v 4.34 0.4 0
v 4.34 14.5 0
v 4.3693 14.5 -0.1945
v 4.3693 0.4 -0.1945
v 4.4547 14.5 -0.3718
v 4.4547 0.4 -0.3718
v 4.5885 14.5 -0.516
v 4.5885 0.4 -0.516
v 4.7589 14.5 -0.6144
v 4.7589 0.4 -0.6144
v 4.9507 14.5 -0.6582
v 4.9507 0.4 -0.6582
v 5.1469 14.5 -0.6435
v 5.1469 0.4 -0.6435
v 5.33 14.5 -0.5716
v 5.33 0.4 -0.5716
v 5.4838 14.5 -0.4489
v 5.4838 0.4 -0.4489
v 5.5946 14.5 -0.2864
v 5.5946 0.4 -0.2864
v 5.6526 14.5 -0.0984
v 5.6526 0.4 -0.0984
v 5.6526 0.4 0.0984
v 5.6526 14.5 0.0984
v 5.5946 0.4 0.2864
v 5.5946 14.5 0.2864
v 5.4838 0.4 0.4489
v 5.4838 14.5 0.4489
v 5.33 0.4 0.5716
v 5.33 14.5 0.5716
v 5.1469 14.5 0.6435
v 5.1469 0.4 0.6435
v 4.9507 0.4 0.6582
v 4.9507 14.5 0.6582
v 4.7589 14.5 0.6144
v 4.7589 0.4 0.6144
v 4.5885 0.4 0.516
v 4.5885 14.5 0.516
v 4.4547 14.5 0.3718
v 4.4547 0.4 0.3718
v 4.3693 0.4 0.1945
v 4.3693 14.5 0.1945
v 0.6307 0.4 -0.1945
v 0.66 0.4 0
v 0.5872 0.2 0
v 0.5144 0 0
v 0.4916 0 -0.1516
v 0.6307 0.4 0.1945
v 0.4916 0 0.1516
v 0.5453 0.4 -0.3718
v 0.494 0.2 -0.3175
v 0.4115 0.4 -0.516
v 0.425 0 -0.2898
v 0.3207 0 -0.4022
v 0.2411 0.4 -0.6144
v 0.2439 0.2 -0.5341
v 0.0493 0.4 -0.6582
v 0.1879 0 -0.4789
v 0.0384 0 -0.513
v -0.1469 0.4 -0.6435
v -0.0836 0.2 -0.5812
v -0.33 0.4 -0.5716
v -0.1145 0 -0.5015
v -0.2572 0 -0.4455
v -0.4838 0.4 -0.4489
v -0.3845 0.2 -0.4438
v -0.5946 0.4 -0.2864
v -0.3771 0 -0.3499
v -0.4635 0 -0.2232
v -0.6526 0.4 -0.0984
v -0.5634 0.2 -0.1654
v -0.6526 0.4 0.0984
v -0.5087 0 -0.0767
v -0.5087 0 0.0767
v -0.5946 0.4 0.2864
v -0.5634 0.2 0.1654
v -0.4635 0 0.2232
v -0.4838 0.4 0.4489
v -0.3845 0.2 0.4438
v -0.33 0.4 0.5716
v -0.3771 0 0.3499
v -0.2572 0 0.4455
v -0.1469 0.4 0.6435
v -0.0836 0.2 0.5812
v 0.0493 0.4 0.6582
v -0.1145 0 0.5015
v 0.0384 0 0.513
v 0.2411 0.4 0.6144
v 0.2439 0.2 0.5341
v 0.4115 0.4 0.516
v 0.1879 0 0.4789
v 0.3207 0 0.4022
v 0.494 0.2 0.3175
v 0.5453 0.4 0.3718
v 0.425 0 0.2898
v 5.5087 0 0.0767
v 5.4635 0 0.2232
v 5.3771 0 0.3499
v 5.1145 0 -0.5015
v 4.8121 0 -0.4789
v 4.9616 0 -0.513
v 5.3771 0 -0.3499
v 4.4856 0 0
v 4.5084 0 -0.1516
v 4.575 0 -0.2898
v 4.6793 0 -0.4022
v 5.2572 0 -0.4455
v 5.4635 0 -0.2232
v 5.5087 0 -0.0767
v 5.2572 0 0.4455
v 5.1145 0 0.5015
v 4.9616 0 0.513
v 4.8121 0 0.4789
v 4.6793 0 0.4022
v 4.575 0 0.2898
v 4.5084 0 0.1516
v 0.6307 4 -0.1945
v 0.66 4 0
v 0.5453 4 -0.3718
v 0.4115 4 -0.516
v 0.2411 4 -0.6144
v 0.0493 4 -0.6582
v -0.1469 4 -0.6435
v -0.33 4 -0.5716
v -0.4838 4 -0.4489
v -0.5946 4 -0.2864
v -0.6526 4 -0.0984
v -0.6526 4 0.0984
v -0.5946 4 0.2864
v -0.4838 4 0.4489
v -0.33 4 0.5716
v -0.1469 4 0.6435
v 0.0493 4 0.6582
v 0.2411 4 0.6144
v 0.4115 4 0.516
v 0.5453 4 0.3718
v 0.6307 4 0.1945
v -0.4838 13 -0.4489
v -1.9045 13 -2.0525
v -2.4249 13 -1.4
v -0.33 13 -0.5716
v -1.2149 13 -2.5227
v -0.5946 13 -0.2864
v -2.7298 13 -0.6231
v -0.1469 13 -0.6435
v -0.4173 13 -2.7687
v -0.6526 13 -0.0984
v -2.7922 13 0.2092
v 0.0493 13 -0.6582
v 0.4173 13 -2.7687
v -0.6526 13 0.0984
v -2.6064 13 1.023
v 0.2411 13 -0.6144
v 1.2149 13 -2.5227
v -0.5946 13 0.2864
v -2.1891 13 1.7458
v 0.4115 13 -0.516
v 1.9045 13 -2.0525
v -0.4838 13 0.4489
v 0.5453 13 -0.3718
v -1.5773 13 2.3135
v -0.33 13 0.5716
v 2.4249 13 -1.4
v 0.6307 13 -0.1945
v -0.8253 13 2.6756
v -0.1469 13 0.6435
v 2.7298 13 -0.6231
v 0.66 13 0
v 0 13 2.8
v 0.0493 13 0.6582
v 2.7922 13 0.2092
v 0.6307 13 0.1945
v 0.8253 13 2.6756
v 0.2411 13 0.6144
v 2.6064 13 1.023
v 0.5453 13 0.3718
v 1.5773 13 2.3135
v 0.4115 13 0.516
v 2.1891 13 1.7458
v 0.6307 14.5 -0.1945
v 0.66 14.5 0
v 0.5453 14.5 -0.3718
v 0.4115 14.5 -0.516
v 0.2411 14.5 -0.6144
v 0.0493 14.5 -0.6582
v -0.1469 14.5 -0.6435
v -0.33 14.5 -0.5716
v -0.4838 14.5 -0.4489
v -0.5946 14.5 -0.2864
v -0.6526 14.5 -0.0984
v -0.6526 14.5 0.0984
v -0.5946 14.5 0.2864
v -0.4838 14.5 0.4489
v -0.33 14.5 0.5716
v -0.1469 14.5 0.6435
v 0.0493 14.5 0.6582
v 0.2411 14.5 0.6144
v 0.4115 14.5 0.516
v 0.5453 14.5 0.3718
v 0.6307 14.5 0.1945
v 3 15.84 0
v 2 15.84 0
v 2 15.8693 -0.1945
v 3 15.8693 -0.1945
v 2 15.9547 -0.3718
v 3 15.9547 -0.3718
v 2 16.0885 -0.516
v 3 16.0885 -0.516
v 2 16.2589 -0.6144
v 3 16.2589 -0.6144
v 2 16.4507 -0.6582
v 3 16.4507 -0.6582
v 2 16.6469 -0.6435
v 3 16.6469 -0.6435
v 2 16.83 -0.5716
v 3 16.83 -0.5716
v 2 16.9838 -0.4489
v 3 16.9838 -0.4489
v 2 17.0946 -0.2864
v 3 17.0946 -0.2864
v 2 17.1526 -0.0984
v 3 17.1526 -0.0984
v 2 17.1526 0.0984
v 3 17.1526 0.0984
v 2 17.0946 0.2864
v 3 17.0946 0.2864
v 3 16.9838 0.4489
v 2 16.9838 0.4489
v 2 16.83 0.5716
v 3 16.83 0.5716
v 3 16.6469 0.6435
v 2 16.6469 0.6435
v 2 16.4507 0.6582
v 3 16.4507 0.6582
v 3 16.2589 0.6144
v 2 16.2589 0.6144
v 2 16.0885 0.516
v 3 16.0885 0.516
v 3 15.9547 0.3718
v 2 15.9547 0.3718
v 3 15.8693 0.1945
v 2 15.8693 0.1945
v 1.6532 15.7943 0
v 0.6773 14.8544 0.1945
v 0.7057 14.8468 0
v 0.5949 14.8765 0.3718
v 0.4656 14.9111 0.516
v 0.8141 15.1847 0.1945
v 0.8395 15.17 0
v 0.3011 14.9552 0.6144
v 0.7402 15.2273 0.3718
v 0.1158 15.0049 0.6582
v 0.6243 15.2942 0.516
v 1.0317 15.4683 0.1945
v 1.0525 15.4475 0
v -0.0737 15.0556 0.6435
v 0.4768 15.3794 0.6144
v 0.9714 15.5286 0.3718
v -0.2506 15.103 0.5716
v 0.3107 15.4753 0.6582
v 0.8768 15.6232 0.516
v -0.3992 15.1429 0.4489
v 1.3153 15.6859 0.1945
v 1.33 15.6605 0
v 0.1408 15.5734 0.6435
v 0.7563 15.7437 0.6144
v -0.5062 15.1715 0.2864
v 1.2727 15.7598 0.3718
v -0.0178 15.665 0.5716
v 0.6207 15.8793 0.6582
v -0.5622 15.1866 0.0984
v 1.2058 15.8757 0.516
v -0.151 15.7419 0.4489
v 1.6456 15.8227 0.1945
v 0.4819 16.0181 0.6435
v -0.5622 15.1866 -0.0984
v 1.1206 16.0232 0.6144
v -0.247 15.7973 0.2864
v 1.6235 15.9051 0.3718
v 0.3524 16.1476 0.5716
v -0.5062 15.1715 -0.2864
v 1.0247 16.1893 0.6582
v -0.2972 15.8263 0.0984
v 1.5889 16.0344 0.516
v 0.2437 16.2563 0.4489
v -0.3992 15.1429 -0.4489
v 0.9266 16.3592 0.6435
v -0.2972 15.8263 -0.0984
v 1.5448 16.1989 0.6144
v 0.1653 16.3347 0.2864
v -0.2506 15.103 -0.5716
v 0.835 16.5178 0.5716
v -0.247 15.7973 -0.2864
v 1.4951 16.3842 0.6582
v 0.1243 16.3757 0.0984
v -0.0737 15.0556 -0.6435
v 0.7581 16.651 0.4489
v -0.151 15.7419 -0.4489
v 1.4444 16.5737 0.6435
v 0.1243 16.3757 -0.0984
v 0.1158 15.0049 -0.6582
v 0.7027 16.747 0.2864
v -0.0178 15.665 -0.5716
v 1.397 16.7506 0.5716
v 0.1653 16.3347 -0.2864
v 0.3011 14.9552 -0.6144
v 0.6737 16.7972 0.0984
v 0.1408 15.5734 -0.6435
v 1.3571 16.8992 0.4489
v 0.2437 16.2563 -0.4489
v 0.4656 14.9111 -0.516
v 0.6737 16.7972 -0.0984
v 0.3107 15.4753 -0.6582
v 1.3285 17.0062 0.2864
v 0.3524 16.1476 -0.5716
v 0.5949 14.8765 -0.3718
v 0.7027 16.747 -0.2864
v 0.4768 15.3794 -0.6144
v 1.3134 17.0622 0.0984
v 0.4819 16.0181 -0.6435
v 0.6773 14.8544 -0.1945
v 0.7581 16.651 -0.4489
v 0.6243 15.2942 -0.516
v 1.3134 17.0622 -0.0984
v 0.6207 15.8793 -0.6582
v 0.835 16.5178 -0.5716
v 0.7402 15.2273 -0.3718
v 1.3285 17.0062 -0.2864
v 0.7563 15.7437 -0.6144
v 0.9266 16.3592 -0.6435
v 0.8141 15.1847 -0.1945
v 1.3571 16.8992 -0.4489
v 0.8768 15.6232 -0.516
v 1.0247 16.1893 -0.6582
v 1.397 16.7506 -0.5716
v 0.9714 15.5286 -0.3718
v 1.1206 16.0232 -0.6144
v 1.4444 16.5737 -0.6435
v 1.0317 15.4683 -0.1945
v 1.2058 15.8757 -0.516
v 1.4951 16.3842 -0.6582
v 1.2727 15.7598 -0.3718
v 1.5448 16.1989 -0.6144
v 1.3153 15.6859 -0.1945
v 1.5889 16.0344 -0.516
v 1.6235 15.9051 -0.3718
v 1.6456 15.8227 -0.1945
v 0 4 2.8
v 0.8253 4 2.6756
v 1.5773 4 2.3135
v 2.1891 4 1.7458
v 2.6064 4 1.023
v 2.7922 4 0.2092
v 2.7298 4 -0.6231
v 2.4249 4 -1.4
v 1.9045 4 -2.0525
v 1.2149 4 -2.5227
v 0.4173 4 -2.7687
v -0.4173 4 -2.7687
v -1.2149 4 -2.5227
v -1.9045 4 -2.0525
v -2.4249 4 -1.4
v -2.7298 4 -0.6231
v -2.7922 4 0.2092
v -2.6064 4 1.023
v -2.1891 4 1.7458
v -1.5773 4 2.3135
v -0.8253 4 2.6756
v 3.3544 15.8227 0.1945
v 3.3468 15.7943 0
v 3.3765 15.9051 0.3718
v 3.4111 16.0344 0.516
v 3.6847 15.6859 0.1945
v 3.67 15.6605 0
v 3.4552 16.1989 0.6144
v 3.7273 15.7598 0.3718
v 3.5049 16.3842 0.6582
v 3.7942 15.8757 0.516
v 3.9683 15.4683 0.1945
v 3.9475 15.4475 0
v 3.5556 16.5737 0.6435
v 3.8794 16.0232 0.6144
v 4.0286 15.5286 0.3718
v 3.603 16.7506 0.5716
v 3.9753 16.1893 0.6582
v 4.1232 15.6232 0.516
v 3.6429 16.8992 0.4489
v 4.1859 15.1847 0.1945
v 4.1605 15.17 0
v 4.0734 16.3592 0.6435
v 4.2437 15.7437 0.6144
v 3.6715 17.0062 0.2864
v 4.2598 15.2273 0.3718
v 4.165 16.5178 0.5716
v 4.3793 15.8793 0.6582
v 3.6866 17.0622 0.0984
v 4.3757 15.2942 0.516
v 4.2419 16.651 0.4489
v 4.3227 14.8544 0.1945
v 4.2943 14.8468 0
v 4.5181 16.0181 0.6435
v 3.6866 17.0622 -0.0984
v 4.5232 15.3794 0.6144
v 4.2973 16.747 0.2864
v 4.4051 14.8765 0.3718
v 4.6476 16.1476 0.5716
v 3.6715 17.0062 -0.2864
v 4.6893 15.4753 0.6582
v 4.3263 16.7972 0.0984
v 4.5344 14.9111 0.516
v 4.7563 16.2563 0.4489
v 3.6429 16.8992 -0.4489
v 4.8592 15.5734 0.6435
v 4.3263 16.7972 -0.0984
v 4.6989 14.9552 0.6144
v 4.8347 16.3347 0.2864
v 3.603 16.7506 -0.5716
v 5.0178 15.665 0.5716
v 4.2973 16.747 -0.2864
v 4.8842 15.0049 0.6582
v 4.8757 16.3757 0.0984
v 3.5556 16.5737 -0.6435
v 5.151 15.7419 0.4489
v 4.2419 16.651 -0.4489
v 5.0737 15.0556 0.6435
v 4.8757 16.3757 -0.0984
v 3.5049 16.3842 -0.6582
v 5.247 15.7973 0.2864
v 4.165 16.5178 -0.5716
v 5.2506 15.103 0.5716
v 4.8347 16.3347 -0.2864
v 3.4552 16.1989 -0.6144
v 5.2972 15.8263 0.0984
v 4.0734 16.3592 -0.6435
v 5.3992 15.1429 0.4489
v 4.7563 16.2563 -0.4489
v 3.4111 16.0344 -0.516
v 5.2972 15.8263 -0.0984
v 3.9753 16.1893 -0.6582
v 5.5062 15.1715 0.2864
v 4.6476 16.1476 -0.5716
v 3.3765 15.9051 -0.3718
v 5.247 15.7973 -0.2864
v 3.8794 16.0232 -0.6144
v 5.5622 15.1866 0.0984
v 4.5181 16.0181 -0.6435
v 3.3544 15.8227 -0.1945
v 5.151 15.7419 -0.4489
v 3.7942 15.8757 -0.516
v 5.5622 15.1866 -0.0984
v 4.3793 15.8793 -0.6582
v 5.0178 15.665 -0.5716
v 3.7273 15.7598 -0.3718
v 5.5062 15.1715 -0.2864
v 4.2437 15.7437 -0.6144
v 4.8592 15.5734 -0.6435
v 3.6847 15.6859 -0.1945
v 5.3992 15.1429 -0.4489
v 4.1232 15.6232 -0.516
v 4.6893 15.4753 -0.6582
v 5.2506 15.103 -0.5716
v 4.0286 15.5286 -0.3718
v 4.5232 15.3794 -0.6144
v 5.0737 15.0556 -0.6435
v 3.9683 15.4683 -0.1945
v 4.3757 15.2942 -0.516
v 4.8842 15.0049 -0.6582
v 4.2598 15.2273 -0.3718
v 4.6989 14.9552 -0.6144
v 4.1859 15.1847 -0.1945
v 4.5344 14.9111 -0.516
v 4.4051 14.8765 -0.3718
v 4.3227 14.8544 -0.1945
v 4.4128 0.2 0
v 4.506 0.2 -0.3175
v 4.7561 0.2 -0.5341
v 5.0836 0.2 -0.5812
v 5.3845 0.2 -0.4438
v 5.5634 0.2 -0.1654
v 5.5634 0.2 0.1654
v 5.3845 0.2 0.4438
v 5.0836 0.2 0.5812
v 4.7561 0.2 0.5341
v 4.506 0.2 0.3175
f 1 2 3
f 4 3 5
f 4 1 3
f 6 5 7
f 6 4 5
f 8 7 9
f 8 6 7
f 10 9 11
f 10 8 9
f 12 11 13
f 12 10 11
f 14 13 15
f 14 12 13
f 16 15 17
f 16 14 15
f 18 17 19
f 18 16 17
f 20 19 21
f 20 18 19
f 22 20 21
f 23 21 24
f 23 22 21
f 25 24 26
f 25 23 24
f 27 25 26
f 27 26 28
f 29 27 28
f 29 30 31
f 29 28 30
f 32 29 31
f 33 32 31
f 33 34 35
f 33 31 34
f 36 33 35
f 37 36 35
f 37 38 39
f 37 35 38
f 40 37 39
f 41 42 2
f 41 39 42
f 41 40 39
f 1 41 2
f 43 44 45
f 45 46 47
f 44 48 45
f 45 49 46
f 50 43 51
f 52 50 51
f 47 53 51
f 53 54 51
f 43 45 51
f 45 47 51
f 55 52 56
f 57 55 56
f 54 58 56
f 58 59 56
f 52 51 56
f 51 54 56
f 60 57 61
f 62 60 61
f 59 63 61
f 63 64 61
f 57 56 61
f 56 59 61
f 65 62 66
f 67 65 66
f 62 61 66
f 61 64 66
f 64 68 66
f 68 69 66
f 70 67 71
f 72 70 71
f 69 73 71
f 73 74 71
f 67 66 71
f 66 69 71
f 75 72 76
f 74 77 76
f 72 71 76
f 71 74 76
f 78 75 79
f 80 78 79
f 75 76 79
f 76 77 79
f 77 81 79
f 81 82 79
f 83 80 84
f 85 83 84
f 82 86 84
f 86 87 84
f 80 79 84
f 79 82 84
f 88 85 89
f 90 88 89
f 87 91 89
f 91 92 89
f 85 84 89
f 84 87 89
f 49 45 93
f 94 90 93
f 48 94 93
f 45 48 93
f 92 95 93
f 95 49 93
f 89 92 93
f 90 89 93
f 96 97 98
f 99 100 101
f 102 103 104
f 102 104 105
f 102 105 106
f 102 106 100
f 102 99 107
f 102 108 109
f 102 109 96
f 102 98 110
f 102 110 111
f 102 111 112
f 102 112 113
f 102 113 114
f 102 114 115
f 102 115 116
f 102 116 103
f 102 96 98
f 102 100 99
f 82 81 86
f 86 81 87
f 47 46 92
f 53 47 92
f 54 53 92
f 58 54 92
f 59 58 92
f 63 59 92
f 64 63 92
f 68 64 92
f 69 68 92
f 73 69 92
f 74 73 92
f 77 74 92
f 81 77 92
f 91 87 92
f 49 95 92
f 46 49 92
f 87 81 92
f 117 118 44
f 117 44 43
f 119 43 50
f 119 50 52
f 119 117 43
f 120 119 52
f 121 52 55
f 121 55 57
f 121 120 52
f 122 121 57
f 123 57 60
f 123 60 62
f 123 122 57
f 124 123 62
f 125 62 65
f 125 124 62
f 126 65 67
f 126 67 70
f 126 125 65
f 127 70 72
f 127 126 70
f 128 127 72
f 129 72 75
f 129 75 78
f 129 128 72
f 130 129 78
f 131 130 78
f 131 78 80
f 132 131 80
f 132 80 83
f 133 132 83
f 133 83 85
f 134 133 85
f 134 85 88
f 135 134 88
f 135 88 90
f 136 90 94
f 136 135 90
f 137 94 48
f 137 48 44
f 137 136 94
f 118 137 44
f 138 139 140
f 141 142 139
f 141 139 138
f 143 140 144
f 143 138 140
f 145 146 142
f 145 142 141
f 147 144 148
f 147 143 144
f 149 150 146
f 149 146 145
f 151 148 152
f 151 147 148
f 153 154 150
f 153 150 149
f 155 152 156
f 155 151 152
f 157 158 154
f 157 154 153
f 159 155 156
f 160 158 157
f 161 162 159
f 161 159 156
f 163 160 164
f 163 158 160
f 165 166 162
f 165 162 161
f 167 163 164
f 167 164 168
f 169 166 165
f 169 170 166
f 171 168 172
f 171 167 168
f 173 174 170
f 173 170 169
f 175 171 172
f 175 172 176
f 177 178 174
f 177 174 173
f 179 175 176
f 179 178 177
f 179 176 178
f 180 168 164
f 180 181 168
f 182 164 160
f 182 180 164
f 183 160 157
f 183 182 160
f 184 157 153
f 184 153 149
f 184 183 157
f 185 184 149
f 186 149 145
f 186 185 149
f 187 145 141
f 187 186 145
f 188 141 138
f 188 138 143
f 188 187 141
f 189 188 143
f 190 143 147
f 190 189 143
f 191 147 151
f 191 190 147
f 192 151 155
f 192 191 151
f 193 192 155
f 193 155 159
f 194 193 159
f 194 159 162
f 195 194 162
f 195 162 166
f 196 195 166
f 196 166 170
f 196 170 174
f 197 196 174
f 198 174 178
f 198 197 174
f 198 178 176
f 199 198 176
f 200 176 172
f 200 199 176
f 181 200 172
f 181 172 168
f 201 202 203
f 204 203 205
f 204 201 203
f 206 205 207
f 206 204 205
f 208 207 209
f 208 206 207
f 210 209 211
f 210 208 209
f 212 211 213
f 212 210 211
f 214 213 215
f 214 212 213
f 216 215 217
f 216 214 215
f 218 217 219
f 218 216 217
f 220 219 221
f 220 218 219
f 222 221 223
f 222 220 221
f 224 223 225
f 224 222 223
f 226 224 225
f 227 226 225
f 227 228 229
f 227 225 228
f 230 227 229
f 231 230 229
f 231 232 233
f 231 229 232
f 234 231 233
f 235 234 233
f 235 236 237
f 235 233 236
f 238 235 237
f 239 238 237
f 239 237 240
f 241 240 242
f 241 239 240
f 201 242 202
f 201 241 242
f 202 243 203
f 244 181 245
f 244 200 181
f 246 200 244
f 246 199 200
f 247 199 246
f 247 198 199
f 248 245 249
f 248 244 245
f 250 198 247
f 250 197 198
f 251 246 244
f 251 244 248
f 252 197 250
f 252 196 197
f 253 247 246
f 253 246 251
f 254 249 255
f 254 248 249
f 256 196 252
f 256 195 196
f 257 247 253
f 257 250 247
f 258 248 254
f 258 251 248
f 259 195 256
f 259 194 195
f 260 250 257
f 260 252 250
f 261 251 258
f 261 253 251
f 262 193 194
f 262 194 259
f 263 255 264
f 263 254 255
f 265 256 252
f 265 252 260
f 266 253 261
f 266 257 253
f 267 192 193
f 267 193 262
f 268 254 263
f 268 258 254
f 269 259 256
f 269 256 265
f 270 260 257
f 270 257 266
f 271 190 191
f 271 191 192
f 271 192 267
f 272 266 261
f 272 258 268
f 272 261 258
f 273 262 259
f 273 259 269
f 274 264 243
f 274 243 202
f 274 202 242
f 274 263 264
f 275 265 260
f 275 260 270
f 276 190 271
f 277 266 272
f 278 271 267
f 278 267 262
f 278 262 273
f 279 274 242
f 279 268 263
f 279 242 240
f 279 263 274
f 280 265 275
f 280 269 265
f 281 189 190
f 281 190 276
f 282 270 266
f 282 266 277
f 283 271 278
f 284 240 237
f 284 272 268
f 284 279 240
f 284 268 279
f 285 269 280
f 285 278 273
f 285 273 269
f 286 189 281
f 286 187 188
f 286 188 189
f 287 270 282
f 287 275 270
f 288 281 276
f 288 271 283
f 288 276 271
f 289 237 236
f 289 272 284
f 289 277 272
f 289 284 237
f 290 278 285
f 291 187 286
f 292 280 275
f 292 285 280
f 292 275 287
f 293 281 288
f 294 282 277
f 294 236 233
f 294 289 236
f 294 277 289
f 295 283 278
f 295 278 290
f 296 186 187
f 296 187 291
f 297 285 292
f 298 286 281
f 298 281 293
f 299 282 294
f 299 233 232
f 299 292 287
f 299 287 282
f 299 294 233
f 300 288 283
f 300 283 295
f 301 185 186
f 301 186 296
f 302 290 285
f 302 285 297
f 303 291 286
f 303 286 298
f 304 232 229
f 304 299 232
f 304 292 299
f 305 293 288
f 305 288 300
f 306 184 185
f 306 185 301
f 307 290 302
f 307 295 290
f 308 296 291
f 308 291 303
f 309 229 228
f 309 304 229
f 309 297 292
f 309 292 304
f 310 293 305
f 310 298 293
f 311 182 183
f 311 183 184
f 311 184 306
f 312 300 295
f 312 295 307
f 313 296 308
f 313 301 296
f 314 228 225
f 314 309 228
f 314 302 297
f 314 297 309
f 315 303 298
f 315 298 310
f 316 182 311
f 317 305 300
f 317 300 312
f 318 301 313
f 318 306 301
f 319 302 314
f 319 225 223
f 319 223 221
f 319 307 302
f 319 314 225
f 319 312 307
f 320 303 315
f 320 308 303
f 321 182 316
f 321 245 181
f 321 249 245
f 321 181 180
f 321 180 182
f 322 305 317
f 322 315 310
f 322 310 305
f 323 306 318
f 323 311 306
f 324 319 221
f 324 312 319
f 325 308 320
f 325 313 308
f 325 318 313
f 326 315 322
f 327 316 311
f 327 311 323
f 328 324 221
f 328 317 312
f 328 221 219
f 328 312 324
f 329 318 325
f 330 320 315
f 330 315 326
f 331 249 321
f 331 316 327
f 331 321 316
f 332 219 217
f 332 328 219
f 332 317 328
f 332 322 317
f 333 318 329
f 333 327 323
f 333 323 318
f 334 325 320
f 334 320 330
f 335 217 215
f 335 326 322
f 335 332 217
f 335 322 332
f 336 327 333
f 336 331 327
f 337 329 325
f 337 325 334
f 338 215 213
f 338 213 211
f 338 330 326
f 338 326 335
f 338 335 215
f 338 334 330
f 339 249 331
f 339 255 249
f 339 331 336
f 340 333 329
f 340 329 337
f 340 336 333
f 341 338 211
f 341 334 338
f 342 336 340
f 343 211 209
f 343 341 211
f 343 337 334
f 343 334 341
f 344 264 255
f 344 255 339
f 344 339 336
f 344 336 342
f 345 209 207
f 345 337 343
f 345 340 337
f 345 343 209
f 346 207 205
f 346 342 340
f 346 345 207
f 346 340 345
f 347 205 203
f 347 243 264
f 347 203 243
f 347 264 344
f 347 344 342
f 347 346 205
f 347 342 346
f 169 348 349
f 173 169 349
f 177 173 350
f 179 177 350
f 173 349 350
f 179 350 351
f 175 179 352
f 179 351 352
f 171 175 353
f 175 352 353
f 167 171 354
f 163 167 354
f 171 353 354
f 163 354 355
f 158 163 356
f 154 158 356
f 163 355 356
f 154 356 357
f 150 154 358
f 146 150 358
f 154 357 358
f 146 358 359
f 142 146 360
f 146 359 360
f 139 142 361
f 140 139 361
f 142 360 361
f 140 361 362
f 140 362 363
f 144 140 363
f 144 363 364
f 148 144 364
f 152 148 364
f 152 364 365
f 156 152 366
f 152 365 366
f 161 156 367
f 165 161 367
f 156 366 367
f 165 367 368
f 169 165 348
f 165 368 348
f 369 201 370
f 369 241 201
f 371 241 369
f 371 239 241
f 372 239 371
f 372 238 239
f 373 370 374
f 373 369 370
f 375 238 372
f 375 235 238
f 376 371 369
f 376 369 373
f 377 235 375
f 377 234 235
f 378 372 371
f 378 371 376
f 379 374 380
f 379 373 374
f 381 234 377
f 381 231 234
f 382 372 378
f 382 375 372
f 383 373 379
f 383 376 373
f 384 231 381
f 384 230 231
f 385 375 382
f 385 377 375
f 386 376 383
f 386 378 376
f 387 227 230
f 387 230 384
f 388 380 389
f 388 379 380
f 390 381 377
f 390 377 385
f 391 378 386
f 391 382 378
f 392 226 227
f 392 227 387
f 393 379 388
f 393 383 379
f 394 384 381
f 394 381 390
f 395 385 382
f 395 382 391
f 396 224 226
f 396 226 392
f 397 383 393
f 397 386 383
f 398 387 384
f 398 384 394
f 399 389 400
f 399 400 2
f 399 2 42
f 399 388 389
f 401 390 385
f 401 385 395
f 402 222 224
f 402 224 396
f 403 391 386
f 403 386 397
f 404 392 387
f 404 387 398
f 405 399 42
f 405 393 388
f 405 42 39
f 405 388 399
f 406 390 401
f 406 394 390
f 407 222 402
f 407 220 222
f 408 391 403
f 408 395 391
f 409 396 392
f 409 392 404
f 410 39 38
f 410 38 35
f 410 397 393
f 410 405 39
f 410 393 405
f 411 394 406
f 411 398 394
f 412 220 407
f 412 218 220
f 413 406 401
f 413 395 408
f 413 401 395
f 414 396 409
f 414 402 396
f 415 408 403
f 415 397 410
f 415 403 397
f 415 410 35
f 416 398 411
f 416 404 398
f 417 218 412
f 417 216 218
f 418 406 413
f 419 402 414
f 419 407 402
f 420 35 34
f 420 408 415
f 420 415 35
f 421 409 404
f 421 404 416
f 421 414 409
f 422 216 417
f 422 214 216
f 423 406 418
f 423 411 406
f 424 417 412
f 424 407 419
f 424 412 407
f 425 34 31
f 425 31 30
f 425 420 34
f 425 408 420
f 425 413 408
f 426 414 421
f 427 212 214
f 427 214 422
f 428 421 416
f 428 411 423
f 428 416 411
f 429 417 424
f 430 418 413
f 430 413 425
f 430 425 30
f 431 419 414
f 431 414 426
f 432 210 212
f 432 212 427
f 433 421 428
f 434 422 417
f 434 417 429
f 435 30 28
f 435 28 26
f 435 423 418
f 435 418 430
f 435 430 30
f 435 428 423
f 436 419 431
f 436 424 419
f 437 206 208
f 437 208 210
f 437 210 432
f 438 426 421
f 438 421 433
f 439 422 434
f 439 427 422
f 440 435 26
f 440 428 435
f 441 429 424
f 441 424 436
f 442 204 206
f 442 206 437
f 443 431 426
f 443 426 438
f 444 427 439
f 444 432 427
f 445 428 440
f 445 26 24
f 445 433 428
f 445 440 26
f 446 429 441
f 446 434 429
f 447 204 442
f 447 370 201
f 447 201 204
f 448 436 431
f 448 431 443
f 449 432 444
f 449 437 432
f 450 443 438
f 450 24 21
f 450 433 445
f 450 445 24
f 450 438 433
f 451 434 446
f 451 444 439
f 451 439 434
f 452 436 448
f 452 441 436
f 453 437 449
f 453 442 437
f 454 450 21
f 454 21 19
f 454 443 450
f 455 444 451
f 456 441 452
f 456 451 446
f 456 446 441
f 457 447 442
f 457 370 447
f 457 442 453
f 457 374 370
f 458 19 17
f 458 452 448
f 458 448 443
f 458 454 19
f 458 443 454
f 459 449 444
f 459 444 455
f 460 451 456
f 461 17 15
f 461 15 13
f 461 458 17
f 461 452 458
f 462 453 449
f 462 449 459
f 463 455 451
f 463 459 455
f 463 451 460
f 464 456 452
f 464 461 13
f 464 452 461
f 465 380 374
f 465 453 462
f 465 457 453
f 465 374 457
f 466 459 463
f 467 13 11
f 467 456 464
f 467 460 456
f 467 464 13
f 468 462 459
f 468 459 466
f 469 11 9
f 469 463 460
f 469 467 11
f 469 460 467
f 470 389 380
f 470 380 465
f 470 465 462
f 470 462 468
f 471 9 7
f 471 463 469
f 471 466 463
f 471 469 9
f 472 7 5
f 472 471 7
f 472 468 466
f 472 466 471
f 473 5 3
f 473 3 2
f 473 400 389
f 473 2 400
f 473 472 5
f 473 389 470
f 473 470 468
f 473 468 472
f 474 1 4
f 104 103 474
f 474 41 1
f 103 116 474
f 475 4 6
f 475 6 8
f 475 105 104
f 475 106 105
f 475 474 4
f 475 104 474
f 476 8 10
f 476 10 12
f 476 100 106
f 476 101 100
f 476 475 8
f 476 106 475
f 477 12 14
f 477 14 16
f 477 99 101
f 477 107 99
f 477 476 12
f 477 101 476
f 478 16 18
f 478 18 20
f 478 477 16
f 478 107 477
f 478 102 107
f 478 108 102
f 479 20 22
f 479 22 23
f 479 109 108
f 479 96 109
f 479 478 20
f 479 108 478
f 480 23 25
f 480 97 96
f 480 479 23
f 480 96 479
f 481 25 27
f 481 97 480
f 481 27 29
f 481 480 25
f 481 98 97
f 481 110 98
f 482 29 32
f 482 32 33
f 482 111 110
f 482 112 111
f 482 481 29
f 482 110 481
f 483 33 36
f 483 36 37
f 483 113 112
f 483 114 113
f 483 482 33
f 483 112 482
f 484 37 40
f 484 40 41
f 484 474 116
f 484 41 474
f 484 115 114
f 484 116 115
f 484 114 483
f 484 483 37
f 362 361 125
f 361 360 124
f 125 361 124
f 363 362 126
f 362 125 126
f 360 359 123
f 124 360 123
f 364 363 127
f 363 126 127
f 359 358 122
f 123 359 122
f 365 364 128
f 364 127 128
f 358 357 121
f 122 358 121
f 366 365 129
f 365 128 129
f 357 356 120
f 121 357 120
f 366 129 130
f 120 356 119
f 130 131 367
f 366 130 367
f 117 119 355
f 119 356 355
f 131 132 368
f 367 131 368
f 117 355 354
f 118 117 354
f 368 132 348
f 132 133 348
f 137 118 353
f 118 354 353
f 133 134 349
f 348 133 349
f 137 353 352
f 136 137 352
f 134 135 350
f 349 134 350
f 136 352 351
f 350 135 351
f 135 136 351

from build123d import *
from OCP.BRepFilletAPI import BRepFilletAPI_MakeChamfer

# Parameters (mm, degrees)
SKETCH_1_R      = 0.66
EXTRUDE_START   = 4
SKETCH_3_R      = 2.8
EXTRUDE_1_DEPTH = 9
CHAMFER_1_SIZE  = 0.4
CHAMFER_1_SIZE2 = 0.145588094


with BuildPart() as part:
    # По траектории1: sweep along a path in Эскиз2
    with BuildLine(Plane.XY) as sweep_1_path:
        Line((0, 0), (0, 14.5))
        ThreePointArc((0, 14.5), (0.585786438, 15.914213562), (2, 16.5))
        Line((2, 16.5), (3, 16.5))
        ThreePointArc((3, 16.5), (4.414213562, 15.914213562), (5, 14.5))
        Line((5, 14.5), (5, 0))
    # Эскиз1 → По траектории1 (sweep)
    with BuildSketch(Plane(origin=(0, 0, 0), x_dir=(1, 0, 0), z_dir=(0, 1, 0))):
        Circle(SKETCH_1_R)
    sweep(path=sweep_1_path.line)

    # Эскиз3 → Бобышка-Вытянуть1 (add)
    with BuildSketch(Plane(origin=(0, 0, 0), x_dir=(1, 0, 0), z_dir=(0, 1, 0)).offset(EXTRUDE_START)):
        with Locations(Location((0, 0, 0), (0, 0, 270))):
            Circle(SKETCH_3_R)
    extrude(amount=EXTRUDE_1_DEPTH)

    # Фаска1: one chamfer whose edges measure the first distance from different faces: ONE call of the kernel's chamfer builder (chamfer() names one face for all edges)
    chamfer_1_edges_1 = [part.edges().sort_by_distance(p)[0] for p in [
        (-0.66, 0, 0),
    ]]
    chamfer_1_side_1 = [part.faces().sort_by_distance(p)[0] for p in [
        (-0.66, 2, 0),
    ]]
    chamfer_1_edges_2 = [part.edges().sort_by_distance(p)[0] for p in [
        (5.66, 0, 0),
    ]]
    chamfer_1_side_2 = [part.faces().sort_by_distance(p)[0] for p in [
        (5.66, 7.25, 0),
    ]]
    chamfer_1 = BRepFilletAPI_MakeChamfer(part.part.solid().wrapped)
    for e in chamfer_1_edges_1:
        chamfer_1.Add(CHAMFER_1_SIZE, CHAMFER_1_SIZE2, e.wrapped, chamfer_1_side_1[0].wrapped)  # the first distance lies on this face
    for e in chamfer_1_edges_2:
        chamfer_1.Add(CHAMFER_1_SIZE, CHAMFER_1_SIZE2, e.wrapped, chamfer_1_side_2[0].wrapped)  # the first distance lies on this face
    add(Compound.cast(chamfer_1.Shape()), mode=Mode.REPLACE)


solid = part.part
